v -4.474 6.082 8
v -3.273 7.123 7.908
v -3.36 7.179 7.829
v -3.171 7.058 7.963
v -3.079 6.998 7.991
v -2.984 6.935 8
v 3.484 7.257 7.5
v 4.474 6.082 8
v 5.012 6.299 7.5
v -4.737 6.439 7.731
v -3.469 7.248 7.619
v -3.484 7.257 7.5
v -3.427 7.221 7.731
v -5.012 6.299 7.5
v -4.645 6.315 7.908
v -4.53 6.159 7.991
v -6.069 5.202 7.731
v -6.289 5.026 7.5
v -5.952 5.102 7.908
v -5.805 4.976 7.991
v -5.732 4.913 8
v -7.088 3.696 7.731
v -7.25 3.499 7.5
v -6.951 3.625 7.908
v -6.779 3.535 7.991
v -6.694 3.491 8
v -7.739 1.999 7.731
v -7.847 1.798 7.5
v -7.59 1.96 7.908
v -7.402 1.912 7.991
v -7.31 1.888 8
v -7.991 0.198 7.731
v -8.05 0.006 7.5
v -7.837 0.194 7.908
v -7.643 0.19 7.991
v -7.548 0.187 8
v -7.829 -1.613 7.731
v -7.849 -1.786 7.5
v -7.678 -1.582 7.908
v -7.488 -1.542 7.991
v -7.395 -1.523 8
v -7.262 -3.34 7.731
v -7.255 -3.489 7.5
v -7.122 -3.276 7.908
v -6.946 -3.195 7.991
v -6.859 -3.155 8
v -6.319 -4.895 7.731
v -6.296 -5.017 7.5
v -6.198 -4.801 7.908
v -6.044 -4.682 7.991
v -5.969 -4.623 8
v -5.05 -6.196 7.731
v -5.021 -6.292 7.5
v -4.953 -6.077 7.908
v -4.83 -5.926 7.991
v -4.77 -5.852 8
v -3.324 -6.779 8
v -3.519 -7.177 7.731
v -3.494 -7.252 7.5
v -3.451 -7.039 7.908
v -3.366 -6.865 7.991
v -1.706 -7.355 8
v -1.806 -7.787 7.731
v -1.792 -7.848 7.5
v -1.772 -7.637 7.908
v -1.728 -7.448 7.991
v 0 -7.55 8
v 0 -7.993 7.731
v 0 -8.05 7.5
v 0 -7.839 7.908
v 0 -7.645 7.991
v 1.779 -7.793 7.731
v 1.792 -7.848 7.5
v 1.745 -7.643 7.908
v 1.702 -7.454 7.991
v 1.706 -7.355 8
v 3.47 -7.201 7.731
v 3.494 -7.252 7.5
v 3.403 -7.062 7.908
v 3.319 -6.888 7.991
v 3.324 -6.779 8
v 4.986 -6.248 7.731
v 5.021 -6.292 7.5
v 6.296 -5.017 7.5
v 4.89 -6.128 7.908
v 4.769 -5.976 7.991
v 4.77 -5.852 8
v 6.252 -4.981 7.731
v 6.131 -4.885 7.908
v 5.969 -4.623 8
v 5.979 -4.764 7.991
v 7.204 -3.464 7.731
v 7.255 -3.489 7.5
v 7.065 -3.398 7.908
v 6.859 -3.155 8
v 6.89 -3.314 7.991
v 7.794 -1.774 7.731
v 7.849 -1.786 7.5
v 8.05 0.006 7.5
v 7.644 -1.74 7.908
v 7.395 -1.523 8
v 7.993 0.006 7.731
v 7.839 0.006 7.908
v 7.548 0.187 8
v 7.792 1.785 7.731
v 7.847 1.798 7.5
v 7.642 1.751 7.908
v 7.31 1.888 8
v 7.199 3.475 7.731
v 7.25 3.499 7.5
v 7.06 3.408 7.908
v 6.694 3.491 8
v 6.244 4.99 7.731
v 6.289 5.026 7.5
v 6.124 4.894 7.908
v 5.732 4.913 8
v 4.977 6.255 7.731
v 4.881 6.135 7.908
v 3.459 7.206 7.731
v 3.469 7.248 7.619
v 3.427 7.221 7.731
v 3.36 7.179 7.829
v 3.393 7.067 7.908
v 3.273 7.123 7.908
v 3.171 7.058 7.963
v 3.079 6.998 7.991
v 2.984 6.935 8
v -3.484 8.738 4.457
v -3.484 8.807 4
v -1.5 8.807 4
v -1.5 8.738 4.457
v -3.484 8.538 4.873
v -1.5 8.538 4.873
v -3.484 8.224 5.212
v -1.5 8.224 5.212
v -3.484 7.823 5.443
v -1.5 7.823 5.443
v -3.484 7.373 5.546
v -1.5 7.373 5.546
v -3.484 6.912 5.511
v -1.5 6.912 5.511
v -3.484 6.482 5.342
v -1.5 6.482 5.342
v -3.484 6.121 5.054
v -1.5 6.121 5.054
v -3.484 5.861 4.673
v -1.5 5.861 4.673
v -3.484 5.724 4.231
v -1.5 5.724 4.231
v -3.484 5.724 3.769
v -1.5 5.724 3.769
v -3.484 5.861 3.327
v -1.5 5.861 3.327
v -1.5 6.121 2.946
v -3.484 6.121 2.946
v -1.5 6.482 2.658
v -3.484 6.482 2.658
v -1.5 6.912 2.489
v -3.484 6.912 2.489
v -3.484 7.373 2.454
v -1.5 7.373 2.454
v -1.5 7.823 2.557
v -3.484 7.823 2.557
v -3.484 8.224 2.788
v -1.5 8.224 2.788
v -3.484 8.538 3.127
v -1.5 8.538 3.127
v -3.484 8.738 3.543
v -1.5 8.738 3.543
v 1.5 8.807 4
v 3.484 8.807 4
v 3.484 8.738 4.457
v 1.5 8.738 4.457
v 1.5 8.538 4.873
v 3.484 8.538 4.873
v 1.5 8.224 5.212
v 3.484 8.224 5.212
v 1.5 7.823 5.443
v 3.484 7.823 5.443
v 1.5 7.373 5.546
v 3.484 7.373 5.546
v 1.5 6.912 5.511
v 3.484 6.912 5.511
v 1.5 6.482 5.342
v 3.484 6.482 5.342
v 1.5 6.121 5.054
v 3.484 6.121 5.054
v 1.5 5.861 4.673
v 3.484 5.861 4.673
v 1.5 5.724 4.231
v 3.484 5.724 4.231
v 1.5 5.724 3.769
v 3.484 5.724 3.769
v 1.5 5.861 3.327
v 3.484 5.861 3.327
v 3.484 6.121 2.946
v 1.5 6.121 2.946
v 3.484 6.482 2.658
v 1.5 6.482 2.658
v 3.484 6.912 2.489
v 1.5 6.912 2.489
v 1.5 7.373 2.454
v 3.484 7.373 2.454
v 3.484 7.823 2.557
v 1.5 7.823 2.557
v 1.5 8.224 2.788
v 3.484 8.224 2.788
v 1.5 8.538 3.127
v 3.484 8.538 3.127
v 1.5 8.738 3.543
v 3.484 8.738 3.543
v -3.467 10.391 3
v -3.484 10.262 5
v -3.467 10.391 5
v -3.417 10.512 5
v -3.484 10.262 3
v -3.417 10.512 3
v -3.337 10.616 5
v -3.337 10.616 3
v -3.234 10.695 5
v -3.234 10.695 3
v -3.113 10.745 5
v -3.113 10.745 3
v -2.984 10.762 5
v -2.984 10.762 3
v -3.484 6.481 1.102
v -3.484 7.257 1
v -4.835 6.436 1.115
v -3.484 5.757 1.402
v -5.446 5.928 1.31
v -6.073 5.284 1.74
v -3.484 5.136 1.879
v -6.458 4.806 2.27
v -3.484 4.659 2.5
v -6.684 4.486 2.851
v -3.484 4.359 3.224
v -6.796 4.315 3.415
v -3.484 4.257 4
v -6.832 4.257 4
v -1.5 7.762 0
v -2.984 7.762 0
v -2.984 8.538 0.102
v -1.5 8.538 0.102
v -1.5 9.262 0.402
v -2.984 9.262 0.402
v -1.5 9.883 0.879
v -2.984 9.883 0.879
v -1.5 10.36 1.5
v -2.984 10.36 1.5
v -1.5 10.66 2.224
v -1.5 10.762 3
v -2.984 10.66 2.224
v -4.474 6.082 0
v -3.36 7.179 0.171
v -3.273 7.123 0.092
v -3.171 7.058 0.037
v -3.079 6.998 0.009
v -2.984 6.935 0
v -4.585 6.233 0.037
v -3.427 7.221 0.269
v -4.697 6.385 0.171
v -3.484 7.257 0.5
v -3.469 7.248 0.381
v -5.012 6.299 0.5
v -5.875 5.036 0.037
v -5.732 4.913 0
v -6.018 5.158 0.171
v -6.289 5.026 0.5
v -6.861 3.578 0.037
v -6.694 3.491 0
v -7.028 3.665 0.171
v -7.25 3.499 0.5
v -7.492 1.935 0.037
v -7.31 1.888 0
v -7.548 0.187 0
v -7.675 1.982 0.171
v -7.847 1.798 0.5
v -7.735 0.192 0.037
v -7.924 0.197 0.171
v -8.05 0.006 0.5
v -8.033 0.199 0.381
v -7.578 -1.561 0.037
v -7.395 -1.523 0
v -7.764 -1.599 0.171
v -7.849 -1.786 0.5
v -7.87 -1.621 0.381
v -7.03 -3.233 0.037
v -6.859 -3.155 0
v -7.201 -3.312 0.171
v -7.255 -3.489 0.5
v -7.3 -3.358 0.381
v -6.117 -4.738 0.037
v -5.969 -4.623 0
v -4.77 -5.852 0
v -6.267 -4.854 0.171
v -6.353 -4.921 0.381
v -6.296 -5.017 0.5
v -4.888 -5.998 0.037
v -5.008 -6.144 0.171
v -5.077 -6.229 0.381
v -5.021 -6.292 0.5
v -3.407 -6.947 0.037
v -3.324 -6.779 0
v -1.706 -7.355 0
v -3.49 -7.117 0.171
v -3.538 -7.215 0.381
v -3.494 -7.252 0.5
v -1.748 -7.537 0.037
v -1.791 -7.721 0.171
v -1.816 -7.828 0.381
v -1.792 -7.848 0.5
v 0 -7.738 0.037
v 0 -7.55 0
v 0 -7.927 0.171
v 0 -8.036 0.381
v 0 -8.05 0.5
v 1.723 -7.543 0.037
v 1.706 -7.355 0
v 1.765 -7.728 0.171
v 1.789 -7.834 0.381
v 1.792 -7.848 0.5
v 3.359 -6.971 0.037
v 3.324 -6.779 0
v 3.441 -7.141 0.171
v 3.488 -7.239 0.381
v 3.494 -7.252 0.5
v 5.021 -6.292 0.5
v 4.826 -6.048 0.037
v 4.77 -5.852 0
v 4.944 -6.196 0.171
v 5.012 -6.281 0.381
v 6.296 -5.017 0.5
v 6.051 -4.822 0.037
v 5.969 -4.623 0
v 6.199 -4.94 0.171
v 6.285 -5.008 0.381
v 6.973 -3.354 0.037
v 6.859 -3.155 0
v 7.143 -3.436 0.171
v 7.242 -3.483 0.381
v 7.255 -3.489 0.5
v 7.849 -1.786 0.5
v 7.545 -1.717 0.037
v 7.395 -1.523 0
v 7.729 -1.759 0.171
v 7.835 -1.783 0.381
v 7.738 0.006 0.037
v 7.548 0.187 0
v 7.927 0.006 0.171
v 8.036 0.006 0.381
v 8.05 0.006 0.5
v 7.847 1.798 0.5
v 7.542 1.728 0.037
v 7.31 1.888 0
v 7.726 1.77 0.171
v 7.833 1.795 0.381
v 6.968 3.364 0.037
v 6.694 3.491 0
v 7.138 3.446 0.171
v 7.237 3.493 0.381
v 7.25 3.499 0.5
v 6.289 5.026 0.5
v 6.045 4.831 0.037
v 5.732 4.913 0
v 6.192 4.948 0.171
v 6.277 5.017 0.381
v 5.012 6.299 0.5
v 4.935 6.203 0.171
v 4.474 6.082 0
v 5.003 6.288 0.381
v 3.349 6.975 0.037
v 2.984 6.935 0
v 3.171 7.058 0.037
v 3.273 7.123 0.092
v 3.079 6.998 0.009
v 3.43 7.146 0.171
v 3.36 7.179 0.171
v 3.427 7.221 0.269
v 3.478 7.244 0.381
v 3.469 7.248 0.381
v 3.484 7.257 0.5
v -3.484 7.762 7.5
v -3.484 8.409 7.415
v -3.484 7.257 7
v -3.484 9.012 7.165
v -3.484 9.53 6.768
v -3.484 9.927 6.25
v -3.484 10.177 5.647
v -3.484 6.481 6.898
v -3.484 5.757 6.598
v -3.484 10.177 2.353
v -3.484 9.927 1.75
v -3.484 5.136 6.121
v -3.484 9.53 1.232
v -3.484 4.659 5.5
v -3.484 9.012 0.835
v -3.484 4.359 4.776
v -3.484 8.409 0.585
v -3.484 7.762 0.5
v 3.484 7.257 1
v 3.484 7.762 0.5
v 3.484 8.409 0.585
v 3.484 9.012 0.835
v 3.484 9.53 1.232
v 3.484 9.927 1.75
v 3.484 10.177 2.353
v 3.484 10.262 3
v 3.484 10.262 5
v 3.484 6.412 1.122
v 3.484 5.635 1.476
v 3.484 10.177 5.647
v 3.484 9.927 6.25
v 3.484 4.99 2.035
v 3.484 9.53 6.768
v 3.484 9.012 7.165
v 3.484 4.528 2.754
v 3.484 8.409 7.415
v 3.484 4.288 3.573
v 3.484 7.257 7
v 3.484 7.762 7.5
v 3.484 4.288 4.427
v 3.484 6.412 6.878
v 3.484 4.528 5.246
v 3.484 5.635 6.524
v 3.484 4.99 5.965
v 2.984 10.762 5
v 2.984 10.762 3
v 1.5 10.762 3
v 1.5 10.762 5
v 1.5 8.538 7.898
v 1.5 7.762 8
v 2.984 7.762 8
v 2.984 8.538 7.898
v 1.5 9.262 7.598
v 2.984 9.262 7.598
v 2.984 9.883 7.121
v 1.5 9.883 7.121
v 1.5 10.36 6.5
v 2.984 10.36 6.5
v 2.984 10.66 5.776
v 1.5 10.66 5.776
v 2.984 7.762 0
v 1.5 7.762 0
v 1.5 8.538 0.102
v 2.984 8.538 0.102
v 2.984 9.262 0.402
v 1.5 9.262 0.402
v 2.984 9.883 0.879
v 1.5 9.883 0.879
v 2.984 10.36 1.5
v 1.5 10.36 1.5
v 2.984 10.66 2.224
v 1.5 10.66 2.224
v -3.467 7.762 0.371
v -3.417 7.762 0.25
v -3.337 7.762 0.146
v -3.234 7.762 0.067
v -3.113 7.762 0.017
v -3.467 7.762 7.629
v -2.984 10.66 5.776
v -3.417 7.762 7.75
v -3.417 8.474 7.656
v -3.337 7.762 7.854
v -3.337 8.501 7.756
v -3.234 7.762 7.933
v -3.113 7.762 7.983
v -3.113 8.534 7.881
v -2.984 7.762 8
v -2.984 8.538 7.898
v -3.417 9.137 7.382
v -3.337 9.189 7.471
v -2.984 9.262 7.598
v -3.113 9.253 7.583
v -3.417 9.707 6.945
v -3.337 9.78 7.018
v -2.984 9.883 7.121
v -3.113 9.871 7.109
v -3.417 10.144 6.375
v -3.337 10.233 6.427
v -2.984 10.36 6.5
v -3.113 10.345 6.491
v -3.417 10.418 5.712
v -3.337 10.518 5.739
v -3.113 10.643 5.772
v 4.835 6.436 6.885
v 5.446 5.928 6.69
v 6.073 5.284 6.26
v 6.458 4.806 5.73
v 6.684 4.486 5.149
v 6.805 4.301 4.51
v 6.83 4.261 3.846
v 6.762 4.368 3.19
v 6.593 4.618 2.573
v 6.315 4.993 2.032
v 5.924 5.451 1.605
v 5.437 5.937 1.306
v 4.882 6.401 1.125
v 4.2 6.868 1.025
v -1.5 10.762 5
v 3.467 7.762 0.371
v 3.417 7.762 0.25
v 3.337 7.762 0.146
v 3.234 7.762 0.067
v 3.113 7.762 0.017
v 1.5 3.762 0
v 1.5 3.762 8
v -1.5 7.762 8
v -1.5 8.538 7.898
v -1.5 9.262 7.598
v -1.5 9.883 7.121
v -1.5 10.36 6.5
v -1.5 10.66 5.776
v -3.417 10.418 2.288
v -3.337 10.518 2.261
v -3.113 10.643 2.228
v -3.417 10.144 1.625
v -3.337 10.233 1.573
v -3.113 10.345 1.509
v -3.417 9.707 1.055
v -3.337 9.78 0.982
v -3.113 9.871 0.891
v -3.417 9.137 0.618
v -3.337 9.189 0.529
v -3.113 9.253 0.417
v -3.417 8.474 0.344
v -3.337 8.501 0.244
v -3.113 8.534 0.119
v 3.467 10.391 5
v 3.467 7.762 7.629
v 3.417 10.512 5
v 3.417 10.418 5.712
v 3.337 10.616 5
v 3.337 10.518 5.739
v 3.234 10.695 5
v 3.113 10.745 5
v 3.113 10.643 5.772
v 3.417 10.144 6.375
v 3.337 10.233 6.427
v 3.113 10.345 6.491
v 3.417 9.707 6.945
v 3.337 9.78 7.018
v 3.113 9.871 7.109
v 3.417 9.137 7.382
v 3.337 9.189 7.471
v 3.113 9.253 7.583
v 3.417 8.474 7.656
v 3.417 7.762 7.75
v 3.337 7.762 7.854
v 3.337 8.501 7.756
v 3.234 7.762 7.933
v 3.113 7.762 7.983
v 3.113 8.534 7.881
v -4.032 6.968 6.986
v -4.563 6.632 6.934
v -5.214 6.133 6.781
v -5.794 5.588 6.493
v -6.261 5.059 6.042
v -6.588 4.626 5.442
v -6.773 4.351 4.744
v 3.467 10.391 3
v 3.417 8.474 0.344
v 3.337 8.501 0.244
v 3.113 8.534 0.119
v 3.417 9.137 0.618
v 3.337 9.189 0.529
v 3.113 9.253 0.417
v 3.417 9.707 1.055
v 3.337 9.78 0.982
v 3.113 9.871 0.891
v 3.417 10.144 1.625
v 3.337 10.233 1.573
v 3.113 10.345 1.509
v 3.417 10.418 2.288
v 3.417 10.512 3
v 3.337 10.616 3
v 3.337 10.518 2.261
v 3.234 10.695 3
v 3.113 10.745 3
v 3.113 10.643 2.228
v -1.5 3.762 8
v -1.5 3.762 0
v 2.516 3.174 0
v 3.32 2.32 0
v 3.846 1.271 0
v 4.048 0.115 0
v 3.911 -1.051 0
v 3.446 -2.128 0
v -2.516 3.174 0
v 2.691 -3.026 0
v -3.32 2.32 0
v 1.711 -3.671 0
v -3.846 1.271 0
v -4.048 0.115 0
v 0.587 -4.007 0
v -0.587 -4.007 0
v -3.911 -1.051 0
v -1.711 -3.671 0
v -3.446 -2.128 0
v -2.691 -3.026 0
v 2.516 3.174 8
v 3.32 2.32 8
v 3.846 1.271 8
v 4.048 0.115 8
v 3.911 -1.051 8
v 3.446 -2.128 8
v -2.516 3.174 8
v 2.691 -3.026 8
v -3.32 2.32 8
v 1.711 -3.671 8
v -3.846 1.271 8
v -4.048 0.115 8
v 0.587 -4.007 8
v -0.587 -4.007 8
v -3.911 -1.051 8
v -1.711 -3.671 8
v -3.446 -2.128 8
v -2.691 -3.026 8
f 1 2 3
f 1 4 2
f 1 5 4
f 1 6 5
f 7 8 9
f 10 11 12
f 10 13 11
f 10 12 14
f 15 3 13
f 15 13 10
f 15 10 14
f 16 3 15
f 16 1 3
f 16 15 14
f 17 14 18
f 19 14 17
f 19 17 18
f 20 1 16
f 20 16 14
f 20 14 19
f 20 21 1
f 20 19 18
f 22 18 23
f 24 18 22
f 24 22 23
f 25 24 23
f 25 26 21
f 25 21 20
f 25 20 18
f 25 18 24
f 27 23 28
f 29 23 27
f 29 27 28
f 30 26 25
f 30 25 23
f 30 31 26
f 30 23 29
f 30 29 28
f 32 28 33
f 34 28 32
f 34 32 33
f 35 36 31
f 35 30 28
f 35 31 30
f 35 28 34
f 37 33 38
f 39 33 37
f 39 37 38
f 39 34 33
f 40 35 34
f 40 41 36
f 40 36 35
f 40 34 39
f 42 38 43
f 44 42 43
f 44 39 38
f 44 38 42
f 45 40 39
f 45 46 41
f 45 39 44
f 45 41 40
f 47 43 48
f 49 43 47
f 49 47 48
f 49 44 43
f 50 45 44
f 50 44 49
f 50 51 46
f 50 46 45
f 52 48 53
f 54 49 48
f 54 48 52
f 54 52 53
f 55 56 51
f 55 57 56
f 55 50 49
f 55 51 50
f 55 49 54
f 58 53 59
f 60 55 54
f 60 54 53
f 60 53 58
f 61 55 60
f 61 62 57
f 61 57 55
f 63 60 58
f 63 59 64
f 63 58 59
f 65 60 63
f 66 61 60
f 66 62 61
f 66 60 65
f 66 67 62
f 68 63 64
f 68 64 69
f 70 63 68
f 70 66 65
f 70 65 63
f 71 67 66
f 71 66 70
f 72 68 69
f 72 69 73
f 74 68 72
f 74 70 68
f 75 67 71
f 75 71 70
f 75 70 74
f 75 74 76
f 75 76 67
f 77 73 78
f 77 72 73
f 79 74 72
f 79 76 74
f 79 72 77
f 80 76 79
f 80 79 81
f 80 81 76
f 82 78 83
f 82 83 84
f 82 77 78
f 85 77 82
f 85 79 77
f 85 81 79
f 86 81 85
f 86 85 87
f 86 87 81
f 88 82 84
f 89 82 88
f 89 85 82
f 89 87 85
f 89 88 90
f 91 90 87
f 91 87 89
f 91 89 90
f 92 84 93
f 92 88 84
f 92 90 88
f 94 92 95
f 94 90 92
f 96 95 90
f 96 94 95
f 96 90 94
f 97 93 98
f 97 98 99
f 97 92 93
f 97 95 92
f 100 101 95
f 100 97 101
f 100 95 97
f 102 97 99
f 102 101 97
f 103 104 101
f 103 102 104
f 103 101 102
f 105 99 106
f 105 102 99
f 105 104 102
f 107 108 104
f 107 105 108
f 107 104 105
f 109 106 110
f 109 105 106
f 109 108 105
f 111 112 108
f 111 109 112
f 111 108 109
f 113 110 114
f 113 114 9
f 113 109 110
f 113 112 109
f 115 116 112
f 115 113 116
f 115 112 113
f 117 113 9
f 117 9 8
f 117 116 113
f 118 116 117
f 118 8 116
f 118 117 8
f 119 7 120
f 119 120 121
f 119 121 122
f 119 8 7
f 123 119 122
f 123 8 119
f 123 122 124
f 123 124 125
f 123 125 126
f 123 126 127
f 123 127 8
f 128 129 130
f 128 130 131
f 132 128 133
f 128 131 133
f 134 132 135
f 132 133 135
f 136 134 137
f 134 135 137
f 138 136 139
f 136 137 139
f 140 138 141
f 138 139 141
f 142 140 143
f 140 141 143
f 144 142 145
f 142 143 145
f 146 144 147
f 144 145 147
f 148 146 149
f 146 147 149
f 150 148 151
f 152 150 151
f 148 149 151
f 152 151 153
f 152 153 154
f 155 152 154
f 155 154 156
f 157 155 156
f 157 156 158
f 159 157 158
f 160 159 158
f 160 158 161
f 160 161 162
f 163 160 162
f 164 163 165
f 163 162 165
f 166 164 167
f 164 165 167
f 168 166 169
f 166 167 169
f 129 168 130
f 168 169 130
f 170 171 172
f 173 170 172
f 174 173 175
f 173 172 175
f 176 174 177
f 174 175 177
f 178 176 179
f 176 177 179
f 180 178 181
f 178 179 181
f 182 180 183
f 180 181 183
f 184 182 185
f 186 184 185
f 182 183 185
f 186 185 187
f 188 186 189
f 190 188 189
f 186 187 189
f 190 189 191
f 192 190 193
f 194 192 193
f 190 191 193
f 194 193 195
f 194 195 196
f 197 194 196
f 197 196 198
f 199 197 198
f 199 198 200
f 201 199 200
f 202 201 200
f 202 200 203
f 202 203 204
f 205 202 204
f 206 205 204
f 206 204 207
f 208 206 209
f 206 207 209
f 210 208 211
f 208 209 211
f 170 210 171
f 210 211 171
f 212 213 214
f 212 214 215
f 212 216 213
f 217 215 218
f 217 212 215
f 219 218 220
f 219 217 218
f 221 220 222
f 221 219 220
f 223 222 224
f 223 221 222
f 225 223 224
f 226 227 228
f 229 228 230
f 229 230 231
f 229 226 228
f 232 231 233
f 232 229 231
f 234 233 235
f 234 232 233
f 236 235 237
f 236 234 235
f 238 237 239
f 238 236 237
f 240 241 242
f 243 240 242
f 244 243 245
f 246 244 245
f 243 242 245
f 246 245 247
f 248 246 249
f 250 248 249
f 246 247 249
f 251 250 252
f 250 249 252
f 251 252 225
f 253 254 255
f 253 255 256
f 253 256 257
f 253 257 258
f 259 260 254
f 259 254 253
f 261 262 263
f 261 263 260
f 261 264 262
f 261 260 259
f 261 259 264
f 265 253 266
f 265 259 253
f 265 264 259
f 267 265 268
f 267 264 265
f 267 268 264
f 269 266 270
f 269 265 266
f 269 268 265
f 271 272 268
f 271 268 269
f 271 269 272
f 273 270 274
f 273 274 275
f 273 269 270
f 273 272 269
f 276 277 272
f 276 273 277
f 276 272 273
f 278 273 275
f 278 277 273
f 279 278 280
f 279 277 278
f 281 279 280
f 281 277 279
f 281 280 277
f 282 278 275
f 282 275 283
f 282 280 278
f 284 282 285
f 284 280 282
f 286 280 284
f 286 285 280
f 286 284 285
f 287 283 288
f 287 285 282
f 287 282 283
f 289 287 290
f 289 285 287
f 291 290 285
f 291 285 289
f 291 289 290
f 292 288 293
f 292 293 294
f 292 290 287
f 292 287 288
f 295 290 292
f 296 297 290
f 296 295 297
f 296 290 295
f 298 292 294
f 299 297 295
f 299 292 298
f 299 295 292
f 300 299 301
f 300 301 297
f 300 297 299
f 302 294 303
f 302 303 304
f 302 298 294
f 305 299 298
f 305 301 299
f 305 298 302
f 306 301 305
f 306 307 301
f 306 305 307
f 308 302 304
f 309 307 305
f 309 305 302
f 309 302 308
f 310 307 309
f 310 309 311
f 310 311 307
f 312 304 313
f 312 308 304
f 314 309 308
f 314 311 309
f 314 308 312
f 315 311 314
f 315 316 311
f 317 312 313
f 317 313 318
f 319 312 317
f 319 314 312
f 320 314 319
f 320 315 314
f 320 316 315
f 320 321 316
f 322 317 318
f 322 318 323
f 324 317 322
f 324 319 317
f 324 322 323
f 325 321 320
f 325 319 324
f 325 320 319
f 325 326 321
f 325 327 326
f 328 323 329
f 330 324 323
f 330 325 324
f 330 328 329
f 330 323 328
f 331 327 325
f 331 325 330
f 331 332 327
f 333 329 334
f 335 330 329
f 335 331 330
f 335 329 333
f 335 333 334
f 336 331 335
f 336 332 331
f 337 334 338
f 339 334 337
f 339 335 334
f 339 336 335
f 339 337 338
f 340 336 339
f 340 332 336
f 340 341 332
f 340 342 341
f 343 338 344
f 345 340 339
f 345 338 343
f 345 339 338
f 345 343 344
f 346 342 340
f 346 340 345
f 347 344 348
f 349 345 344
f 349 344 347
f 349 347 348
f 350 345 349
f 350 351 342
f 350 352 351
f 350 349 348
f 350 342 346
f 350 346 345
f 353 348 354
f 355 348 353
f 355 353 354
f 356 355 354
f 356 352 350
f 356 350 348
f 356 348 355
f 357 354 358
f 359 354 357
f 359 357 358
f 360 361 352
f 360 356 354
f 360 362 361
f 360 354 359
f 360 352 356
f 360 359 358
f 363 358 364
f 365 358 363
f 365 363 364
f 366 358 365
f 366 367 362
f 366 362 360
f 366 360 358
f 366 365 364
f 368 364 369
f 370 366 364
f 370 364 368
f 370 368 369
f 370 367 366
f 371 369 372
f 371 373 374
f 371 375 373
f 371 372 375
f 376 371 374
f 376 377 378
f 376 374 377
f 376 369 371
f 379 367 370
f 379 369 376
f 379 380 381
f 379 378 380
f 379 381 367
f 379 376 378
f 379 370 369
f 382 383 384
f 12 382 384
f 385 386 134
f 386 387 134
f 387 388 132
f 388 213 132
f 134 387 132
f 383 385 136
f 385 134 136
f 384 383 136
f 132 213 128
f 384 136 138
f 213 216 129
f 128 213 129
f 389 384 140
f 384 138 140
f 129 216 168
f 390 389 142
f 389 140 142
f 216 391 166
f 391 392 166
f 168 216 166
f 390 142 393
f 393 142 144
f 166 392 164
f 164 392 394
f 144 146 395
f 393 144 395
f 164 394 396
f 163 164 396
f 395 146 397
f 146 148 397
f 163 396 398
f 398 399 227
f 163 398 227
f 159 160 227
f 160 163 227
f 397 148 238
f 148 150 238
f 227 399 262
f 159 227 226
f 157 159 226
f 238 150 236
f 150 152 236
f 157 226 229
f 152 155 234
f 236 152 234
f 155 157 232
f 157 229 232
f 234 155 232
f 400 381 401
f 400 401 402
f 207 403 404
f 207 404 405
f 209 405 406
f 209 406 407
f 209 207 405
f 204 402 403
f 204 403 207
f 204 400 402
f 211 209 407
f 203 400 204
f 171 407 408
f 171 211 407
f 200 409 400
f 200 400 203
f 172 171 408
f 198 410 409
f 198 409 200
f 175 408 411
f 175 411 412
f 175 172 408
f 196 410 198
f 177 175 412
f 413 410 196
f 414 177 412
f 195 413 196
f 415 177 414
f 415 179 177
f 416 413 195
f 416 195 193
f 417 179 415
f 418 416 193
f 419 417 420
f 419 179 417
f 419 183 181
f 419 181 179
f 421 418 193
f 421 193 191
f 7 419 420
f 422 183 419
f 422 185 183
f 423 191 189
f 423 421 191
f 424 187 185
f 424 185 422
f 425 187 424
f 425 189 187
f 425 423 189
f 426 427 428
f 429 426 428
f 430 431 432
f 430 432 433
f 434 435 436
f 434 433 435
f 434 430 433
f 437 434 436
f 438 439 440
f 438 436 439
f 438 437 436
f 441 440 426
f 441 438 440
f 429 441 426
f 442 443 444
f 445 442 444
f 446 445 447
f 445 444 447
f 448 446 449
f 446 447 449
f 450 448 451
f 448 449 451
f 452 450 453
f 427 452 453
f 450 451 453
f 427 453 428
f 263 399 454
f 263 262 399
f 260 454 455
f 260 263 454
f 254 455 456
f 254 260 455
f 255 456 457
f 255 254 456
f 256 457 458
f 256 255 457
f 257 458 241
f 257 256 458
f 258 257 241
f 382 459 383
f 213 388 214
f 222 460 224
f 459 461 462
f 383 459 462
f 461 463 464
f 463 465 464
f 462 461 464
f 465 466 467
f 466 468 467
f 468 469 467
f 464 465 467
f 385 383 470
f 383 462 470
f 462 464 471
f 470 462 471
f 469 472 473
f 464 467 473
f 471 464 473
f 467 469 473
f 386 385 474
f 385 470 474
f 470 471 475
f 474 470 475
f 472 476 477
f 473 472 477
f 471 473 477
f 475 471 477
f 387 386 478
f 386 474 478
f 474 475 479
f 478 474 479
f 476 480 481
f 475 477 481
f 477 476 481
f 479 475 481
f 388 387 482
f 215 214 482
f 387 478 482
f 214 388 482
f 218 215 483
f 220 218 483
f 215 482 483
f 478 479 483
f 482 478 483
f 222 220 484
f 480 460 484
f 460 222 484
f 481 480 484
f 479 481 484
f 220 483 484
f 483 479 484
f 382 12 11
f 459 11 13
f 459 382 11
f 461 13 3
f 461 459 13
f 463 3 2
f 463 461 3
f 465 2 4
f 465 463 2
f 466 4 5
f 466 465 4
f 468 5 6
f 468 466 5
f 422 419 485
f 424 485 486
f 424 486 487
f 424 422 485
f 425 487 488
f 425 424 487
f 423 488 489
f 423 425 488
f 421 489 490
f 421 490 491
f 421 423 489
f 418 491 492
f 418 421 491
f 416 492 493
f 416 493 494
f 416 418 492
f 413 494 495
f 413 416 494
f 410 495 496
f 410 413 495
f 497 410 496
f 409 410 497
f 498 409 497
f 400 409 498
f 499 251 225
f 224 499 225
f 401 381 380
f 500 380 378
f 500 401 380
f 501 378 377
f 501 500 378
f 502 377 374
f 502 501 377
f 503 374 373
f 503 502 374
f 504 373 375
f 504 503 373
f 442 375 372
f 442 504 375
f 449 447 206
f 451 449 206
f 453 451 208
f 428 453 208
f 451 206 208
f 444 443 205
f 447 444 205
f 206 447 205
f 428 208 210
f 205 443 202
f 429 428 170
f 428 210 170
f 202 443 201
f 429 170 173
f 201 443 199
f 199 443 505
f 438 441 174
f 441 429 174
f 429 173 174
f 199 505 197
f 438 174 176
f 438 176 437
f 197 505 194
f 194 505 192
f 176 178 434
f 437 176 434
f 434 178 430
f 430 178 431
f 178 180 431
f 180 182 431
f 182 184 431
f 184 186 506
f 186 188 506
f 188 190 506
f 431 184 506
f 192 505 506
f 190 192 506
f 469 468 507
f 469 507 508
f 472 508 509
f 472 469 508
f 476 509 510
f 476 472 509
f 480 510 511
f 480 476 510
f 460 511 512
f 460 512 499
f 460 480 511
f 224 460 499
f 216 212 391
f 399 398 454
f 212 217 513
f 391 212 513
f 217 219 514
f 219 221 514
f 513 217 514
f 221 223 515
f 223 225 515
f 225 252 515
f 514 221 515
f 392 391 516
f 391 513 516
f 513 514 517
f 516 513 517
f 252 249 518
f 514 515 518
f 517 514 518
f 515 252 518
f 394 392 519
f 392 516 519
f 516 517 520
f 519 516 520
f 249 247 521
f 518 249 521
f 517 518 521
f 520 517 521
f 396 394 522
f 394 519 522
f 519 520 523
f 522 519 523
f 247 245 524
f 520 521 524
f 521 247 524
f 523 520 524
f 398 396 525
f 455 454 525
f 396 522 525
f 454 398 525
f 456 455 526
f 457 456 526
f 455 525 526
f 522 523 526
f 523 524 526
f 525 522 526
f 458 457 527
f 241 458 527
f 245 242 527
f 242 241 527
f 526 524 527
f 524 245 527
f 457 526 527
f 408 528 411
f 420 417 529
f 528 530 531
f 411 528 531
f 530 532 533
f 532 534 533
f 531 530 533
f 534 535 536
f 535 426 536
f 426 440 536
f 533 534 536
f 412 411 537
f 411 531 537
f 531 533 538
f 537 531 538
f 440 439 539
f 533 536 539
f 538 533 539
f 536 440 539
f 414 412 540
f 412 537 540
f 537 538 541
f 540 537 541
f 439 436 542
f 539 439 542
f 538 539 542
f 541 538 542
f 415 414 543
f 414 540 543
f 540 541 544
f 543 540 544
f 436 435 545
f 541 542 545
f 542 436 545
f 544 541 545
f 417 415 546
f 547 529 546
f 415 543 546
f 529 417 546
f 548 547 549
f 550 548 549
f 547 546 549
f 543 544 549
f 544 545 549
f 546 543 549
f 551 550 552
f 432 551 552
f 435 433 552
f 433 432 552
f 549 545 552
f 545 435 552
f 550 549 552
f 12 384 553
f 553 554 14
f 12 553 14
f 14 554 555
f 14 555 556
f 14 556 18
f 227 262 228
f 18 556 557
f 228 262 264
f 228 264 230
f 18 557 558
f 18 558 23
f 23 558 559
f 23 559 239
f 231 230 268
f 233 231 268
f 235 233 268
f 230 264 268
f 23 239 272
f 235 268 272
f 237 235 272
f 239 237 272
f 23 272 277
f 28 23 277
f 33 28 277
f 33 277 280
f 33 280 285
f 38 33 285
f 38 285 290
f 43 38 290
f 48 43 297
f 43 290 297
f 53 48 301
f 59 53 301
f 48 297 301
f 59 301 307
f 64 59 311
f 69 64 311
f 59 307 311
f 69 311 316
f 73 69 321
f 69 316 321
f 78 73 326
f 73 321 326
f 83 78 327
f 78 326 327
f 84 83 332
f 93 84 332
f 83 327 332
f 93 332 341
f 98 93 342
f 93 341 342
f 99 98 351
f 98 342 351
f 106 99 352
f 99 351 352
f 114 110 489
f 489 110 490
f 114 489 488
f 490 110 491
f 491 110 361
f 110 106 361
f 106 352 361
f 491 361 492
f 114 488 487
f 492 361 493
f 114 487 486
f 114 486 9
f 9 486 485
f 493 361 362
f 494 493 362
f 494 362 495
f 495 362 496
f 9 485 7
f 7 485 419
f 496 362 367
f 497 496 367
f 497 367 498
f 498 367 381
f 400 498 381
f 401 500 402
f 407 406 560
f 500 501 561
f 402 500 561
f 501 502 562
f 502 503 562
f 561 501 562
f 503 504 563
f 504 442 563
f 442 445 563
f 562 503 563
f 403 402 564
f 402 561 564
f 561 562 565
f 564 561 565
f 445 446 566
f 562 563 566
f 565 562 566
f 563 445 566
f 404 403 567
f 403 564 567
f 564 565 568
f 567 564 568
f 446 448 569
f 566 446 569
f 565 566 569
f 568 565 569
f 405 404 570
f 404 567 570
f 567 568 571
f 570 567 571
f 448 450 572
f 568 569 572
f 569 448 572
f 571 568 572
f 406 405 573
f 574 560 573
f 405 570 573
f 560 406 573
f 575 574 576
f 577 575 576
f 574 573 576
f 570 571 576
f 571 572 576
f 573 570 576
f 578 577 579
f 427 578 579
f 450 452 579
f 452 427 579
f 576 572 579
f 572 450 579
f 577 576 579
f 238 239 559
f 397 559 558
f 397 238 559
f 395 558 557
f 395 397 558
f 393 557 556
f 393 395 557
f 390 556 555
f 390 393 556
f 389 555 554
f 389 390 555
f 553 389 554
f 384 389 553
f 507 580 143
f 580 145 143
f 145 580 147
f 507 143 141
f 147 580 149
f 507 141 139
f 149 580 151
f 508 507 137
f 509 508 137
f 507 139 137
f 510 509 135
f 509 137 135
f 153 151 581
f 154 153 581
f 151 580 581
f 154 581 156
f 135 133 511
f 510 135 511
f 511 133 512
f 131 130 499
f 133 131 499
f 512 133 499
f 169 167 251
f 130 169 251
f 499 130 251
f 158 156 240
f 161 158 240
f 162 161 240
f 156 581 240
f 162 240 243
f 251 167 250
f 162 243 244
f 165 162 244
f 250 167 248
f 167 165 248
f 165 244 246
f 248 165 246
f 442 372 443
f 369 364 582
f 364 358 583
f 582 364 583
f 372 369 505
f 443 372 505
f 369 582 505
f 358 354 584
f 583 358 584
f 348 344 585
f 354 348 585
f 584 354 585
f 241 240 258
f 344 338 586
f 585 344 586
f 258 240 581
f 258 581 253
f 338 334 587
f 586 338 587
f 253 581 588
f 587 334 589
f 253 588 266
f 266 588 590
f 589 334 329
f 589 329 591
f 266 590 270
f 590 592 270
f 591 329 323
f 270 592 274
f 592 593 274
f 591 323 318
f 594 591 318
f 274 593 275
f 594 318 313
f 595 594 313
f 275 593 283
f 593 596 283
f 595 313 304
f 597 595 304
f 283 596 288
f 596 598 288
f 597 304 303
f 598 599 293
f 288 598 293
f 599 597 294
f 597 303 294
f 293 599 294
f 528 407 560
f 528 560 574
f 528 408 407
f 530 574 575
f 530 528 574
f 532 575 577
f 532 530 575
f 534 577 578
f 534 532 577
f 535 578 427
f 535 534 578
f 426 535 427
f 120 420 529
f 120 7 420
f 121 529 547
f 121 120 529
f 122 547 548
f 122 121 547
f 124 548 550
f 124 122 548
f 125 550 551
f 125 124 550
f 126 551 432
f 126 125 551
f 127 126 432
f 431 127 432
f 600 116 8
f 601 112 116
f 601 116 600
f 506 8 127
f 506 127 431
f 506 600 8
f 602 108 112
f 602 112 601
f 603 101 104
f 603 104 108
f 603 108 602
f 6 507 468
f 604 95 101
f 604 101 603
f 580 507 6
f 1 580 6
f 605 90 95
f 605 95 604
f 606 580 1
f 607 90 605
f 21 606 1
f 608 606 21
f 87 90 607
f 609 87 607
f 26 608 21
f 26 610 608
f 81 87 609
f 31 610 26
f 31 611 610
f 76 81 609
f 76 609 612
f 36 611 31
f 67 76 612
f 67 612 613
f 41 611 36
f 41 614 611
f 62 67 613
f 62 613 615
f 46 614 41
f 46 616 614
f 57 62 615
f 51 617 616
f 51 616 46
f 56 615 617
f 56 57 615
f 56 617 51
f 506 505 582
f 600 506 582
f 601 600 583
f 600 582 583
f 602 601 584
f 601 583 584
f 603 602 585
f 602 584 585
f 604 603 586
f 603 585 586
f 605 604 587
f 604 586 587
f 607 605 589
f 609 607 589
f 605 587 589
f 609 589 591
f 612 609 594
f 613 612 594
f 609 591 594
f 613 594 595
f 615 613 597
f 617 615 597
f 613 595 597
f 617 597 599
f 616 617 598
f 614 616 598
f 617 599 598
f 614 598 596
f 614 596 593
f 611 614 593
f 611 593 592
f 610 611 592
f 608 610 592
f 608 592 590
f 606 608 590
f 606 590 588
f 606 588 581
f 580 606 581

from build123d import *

# Parameters (mm, degrees)
F1_DEPTH = 8
F2_R     = 1.55
F3_DEPTH = 12.5
F4_DEPTH = 1
F6_DEPTH = 25
F8_DEPTH = 25
F9_R     = 3
F10_R    = 3
F11_R    = 0.5


with BuildPart() as f1:
    # F0 (on Top) → F1 (new body)
    with BuildSketch(Plane.XY):
        with BuildLine():
            ThreePointArc((1.5, 3.7619808612), (0, -4.05), (-1.5, 3.7619808612))
            Line((-1.5, 3.7619808612), (-1.5, 7.909013845))
            Line((-1.5, 7.909013845), (-1.5, 9.7619808612))
            Line((-1.5, 9.7619808612), (-3.4838211723, 9.7619808612))
            Line((-3.4838211723, 9.7619808612), (-3.4838211723, 7.2570992855))
            ThreePointArc((-3.4838211723, 7.2570992855), (0, -8.05), (3.4838211723, 7.2570992855))
            Line((3.4838211723, 7.2570992855), (3.4838211723, 9.7619808612))
            Line((3.4838211723, 9.7619808612), (1.5, 9.7619808612))
            Line((1.5, 9.7619808612), (1.5, 7.909013845))
            Line((1.5, 7.909013845), (1.5, 3.7619808612))
        make_face()
    extrude(amount=F1_DEPTH)

    # F2 (on Right) → F3 (cut, symmetric)
    with BuildSketch(Plane.YZ):
        with Locations((7.2570992855, 4)):
            Circle(F2_R)
    extrude(amount=F3_DEPTH, both=True, mode=Mode.SUBTRACT)

    # F4 (add): faces of the model
    f4_faces = [f1.faces().sort_by_distance(p)[0] for p in [
        (2.4919105861, 9.7619808612, 4),
        (-2.4919105861, 9.7619808612, 4),
    ]]
    extrude(f4_faces, amount=F4_DEPTH)

    # F5 (on face) → F6 (cut)
    with BuildSketch(Plane.YZ.offset(3.4838211723)):
        with BuildLine():
            Line((7.2570992855, 5.55), (7.2570992855, 7))
            ThreePointArc((7.2570992855, 7), (4.2570992855, 4), (7.2570992855, 1))
            Line((7.2570992855, 1), (7.2570992855, 2.45))
            ThreePointArc((7.2570992855, 2.45), (8.3531147963, 2.9039844892), (8.8070992855, 4))
            ThreePointArc((8.8070992855, 4), (8.3531147963, 5.0960155108), (7.2570992855, 5.55))
        make_face()
    extrude(amount=F6_DEPTH, mode=Mode.SUBTRACT)

    # F7 (on face) → F8 (cut)
    with BuildSketch(Plane(origin=(-3.4838211723, 0, 0), x_dir=(0, -1, 0), z_dir=(-1, 0, 0))):
        with BuildLine():
            ThreePointArc((-7.2570992855, 1), (-5.1357789419, 1.8786796564), (-4.2570992855, 4))
            ThreePointArc((-4.2570992855, 4), (-5.1357789419, 6.1213203436), (-7.2570992855, 7))
            Line((-7.2570992855, 7), (-7.2570992855, 5.55))
            ThreePointArc((-7.2570992855, 5.55), (-8.3531147963, 5.0960155108), (-8.8070992855, 4))
            ThreePointArc((-8.8070992855, 4), (-8.3531147963, 2.9039844892), (-7.2570992855, 2.45))
            Line((-7.2570992855, 2.45), (-7.2570992855, 1))
        make_face()
    extrude(amount=F8_DEPTH, mode=Mode.SUBTRACT)

    # F9
    f9_edges = [f1.edges().sort_by_distance(p)[0] for p in [
        (2.491911, 10.761981, 8),
        (2.491911, 10.761981, 0),
    ]]
    fillet(f9_edges, radius=F9_R)

    # F10
    f10_edges = [f1.edges().sort_by_distance(p)[0] for p in [
        (-2.491911, 10.761981, 8),
        (-2.491911, 10.761981, 0),
    ]]
    fillet(f10_edges, radius=F10_R)

    # F11
    f11_edges = [f1.edges().sort_by_distance(p)[0] for p in [
        (-3.483821, 9.883301, 7.12132),
        (-3.483821, 7.50954, 8),
        (0, -8.05, 8),
        (3.483821, 7.50954, 8),
        (3.483821, 9.883301, 7.12132),
        (3.483821, 10.761981, 4),
        (-3.483821, 10.761981, 4),
        (-3.483821, 9.883301, 0.87868),
        (-3.483821, 7.50954, 0),
        (0, -8.05, 0),
        (3.483821, 7.50954, 0),
        (3.483821, 9.883301, 0.87868),
    ]]
    fillet(f11_edges, radius=F11_R)


solid = f1.part
